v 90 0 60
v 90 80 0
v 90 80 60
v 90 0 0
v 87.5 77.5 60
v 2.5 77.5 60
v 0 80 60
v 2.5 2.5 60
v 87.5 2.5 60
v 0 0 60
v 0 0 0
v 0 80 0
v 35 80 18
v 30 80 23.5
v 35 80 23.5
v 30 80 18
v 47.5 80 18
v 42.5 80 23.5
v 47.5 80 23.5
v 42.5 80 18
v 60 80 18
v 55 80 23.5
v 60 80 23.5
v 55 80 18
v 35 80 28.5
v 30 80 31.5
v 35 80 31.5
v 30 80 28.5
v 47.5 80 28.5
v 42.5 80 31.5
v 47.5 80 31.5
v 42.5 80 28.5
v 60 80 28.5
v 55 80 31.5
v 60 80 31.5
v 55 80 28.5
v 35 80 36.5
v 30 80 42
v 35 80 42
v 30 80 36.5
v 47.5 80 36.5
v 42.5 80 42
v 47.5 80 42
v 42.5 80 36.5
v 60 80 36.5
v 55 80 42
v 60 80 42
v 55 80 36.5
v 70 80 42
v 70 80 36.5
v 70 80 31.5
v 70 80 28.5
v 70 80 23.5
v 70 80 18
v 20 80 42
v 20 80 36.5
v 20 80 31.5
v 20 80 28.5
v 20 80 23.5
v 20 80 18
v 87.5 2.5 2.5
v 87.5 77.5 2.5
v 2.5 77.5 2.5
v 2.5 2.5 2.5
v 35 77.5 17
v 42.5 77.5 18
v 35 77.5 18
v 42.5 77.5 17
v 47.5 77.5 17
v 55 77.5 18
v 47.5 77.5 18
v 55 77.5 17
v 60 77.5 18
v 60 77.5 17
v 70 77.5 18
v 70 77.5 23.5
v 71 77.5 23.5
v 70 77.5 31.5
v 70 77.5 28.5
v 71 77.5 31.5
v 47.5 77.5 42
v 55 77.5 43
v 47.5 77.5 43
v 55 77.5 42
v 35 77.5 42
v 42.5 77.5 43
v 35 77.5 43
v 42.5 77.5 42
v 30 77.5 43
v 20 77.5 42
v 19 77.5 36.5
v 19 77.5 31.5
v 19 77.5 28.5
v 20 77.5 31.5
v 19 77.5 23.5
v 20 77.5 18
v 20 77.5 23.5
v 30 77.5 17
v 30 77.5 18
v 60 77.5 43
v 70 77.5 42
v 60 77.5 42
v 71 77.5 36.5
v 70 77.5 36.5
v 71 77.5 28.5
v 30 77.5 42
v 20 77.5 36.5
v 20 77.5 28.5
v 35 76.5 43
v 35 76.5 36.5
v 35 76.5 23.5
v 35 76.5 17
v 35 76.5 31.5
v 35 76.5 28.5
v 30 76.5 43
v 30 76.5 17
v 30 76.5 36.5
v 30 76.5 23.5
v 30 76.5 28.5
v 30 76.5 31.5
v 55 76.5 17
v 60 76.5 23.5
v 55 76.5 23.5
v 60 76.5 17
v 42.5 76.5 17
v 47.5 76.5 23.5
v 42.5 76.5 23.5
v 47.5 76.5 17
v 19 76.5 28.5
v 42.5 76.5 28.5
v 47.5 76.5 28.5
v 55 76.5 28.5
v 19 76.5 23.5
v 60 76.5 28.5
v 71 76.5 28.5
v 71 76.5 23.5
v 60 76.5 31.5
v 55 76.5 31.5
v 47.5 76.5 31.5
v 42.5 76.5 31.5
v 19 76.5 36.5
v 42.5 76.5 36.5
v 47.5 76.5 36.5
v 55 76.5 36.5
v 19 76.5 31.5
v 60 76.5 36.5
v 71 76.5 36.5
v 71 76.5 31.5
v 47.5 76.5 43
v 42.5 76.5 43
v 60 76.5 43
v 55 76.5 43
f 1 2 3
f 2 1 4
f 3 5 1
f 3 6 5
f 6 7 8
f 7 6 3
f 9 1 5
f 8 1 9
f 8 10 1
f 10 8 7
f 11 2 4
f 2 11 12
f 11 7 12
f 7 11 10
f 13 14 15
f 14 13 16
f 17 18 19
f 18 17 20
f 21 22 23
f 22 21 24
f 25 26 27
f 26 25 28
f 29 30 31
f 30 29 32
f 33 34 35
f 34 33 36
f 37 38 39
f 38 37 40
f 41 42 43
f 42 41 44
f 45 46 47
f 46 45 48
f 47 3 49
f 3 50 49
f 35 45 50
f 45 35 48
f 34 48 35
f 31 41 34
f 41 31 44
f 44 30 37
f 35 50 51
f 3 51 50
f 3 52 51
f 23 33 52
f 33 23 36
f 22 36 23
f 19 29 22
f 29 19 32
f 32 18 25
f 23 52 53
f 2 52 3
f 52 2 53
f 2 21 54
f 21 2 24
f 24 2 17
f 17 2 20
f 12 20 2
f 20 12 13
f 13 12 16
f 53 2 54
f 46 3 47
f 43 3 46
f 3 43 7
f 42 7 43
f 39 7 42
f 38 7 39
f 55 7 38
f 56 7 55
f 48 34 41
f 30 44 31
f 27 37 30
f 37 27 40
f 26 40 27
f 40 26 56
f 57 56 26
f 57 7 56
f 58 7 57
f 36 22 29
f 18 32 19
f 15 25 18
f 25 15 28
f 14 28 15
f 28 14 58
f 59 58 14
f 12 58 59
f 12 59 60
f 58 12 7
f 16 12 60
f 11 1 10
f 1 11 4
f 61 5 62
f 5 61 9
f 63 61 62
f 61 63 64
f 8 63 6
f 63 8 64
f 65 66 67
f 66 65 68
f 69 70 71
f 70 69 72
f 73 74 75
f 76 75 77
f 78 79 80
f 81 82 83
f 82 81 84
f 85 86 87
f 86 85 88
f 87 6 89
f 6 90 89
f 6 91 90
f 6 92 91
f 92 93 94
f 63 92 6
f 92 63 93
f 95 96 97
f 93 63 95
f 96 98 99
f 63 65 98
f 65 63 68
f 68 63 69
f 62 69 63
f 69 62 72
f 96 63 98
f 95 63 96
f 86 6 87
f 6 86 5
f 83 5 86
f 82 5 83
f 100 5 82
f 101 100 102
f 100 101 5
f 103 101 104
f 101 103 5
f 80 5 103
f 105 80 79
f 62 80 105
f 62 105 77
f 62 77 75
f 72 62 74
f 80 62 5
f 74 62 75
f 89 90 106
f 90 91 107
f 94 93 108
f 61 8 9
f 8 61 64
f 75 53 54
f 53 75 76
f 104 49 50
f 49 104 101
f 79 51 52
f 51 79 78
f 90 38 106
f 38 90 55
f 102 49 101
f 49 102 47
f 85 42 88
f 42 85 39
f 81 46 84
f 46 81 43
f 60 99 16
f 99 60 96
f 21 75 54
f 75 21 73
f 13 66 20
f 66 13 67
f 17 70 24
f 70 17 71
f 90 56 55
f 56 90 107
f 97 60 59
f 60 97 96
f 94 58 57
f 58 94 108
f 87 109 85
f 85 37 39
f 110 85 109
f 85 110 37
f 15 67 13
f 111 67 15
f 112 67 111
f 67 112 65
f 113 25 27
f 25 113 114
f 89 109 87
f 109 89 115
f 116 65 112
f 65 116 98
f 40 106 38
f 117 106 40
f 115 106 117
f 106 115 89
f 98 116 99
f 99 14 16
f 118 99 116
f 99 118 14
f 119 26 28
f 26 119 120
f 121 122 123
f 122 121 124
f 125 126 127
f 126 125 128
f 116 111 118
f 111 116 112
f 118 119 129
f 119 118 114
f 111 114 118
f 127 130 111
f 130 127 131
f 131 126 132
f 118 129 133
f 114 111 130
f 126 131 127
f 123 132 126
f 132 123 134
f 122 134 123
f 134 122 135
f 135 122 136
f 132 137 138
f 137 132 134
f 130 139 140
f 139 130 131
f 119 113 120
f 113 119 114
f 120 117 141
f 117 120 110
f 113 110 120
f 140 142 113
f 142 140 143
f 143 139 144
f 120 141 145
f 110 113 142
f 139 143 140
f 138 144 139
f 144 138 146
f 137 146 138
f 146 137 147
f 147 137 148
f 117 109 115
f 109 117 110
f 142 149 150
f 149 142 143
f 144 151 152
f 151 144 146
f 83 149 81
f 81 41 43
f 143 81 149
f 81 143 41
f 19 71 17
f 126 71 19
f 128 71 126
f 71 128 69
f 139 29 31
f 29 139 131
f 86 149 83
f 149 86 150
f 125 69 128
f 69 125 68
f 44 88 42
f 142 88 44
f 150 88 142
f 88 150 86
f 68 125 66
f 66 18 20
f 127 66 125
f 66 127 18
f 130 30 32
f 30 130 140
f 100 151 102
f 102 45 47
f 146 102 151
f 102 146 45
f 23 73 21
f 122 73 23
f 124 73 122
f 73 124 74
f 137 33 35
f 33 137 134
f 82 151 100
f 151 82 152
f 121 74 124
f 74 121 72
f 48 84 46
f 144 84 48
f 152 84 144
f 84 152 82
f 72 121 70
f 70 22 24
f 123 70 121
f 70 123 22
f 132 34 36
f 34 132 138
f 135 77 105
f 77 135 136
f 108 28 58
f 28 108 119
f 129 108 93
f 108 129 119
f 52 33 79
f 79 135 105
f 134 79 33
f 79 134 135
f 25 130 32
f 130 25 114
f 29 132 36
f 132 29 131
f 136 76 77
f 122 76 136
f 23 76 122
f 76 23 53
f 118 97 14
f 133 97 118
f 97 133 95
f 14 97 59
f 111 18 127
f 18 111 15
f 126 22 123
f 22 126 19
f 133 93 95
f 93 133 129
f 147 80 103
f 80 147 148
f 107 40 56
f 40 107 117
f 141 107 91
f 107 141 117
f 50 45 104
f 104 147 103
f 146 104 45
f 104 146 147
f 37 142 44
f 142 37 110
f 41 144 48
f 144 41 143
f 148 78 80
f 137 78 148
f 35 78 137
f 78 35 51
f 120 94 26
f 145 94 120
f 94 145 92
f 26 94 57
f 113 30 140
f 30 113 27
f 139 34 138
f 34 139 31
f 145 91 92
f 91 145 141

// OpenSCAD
$fn = 32;

// ----------------------------------------------------------------------
// Vent box: crossgrid enclosure
// ----------------------------------------------------------------------

// --- parameters (mm) ---
box_l = 90;               // box length, X
box_w = 80;               // box width, Y
box_h = 60;               // box height, Z
wall_t = 2.5;             // shell wall thickness
win_l = 50;               // vent window width, X
win_h = 24;               // vent window height, Z
bar_w = 5;                // grid bar width
n_v = 3;                  // vertical bar count
n_h = 2;                  // horizontal bar count

win_z0 = (box_h - win_h) / 2;  // window lower edge Z
v_step = win_l / (n_v + 1);  // vertical bar step
h_step = win_h / (n_h + 1);  // horizontal bar step

difference() {
  union() {
    difference() {
      cube([box_l, box_w, box_h]);
  translate([wall_t, wall_t, wall_t])
    cube([box_l - 2 * wall_t, box_w - 2 * wall_t, box_h]);
  translate([(box_l - win_l) / 2, box_w - wall_t - 1, win_z0])
    cube([win_l, wall_t + 2, win_h]);
    }
    for (i = [1 : n_v])
      translate([(box_l - win_l) / 2 + i * v_step - bar_w / 2,
                 box_w - wall_t - 1, win_z0 - 1])
        cube([bar_w, wall_t + 1, win_h + 2]);
    for (i = [1 : n_h])
      translate([(box_l - win_l) / 2 - 1, box_w - wall_t - 1,
                 win_z0 + i * h_step - bar_w / 2])
        cube([win_l + 2, wall_t + 1, bar_w]);
  }
}
